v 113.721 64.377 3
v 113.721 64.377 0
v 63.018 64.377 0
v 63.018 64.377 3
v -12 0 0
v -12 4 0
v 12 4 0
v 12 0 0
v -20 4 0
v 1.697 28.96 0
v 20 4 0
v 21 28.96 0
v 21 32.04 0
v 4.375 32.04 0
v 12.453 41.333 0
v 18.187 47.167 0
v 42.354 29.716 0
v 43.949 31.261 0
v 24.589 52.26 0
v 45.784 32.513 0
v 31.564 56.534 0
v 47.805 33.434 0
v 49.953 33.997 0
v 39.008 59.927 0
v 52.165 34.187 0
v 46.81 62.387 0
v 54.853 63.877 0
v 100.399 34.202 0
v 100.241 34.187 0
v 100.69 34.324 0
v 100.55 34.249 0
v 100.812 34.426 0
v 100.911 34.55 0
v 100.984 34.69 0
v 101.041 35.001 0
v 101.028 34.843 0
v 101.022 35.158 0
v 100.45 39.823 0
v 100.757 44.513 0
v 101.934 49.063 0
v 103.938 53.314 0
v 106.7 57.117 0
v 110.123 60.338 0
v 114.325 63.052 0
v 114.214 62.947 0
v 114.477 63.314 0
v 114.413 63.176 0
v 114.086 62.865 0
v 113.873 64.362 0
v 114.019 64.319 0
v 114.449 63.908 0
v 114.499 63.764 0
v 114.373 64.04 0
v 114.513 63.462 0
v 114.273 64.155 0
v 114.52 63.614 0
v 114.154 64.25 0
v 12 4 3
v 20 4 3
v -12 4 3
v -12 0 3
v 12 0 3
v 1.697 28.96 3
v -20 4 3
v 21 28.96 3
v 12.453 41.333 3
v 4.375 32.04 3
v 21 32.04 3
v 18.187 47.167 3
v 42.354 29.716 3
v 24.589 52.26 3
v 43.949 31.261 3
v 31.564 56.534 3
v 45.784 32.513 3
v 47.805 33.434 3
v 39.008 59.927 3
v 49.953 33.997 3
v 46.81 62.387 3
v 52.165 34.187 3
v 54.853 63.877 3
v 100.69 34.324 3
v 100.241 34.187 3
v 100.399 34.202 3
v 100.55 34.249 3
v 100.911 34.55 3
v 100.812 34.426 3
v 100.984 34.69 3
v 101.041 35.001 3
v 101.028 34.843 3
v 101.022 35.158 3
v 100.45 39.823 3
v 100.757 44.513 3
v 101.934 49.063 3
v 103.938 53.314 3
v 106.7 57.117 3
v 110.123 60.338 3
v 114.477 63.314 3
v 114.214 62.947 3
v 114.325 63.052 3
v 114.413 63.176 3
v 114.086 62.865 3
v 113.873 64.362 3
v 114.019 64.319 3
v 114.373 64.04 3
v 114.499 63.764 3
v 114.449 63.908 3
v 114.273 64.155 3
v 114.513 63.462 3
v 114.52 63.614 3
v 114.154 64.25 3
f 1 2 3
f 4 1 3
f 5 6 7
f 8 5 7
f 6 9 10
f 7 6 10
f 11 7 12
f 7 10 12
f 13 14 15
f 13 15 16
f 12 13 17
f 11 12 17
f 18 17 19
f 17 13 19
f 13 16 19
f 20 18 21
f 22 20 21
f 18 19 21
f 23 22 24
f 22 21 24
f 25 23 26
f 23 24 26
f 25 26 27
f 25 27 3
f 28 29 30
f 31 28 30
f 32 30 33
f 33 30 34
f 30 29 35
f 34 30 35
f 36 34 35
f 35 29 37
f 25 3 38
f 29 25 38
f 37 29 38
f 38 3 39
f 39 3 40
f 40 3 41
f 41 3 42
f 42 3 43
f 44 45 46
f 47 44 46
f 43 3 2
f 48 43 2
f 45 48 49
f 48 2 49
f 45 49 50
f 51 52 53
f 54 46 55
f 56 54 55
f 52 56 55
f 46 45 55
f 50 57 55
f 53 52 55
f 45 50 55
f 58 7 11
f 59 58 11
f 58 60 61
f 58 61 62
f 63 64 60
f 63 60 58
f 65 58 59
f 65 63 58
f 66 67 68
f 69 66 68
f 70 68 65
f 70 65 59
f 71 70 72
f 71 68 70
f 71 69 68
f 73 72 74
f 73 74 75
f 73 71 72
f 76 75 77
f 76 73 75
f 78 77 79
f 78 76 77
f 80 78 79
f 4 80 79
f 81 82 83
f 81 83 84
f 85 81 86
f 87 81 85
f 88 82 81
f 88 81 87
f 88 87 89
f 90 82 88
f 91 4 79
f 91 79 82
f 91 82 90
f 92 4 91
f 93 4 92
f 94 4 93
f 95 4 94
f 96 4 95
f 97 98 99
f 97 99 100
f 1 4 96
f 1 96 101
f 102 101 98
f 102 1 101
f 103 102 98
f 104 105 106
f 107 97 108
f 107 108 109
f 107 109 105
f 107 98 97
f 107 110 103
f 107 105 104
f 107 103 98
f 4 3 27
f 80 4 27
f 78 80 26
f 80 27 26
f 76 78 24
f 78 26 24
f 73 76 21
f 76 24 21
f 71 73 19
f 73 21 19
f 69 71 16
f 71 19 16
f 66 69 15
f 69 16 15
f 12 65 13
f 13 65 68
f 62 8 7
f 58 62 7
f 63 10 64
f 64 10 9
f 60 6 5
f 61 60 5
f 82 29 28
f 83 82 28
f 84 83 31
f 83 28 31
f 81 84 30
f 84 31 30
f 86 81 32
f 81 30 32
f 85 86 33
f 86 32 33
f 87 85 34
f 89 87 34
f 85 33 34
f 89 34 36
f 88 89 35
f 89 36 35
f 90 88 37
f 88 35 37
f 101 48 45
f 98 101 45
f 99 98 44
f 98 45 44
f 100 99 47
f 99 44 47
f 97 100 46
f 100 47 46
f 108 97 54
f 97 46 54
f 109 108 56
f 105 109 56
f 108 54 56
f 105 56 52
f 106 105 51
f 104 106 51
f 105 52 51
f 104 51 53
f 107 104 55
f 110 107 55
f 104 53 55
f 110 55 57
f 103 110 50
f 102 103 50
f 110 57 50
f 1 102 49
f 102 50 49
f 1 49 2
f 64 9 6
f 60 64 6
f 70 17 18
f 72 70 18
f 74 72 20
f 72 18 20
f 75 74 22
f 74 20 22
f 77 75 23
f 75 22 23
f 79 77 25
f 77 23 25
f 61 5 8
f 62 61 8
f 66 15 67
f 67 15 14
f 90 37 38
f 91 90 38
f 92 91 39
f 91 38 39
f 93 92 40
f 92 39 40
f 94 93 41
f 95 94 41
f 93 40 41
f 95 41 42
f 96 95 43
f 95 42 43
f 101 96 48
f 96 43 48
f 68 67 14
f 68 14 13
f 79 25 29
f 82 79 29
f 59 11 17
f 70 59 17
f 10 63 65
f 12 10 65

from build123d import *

# Parameters (mm, degrees)
BOSS_EXTRUDE1_DEPTH = 3
SKETCH2_W           = 31.541335057
SKETCH2_H           = 3.08
CUT_EXTRUDE1_DEPTH  = 3


with BuildPart() as part:
    # Sketch1 → Boss-Extrude1 (new body)
    with BuildSketch(Plane.XY):
        with BuildLine():
            Line((12.452839565, 41.33272136), (-20, 4))
            Line((-20, 4), (-12, 4))
            Line((-12, 4), (-12, 0))
            Line((-12, 0), (12, 0))
            Line((12, 0), (12, 4))
            Line((12, 4), (20, 4))
            Line((20, 4), (42.354172484, 29.715533795))
            ThreePointArc((42.354172484, 29.715533795), (46.774384872, 33.016262939), (52.165397026, 34.186766418))
            Line((52.165397026, 34.186766418), (100.240955705, 34.186766418))
            ThreePointArc((100.240955705, 34.186766418), (100.86429233, 34.485317067), (101.02238507, 35.158137789))
            ThreePointArc((101.02238507, 35.158137789), (102.836349044, 51.235945442), (114.085991202, 62.864871253))
            ThreePointArc((114.085991202, 62.864871253), (114.498680148, 63.764494769), (113.721018225, 64.376766418))
            Line((113.721018225, 64.376766418), (63.01838144, 64.376766418))
            ThreePointArc((63.01838144, 64.376766418), (35.233934182, 58.344171567), (12.452839565, 41.33272136))
        make_face()
    extrude(amount=BOSS_EXTRUDE1_DEPTH)

    # Sketch2 → Cut-Extrude1 (cut)
    with BuildSketch(Plane.XY.offset(3)):
        with Locations((5.229332471, 30.5)):
            Rectangle(SKETCH2_W, SKETCH2_H)
    extrude(amount=-CUT_EXTRUDE1_DEPTH, mode=Mode.SUBTRACT)


solid = part.part
